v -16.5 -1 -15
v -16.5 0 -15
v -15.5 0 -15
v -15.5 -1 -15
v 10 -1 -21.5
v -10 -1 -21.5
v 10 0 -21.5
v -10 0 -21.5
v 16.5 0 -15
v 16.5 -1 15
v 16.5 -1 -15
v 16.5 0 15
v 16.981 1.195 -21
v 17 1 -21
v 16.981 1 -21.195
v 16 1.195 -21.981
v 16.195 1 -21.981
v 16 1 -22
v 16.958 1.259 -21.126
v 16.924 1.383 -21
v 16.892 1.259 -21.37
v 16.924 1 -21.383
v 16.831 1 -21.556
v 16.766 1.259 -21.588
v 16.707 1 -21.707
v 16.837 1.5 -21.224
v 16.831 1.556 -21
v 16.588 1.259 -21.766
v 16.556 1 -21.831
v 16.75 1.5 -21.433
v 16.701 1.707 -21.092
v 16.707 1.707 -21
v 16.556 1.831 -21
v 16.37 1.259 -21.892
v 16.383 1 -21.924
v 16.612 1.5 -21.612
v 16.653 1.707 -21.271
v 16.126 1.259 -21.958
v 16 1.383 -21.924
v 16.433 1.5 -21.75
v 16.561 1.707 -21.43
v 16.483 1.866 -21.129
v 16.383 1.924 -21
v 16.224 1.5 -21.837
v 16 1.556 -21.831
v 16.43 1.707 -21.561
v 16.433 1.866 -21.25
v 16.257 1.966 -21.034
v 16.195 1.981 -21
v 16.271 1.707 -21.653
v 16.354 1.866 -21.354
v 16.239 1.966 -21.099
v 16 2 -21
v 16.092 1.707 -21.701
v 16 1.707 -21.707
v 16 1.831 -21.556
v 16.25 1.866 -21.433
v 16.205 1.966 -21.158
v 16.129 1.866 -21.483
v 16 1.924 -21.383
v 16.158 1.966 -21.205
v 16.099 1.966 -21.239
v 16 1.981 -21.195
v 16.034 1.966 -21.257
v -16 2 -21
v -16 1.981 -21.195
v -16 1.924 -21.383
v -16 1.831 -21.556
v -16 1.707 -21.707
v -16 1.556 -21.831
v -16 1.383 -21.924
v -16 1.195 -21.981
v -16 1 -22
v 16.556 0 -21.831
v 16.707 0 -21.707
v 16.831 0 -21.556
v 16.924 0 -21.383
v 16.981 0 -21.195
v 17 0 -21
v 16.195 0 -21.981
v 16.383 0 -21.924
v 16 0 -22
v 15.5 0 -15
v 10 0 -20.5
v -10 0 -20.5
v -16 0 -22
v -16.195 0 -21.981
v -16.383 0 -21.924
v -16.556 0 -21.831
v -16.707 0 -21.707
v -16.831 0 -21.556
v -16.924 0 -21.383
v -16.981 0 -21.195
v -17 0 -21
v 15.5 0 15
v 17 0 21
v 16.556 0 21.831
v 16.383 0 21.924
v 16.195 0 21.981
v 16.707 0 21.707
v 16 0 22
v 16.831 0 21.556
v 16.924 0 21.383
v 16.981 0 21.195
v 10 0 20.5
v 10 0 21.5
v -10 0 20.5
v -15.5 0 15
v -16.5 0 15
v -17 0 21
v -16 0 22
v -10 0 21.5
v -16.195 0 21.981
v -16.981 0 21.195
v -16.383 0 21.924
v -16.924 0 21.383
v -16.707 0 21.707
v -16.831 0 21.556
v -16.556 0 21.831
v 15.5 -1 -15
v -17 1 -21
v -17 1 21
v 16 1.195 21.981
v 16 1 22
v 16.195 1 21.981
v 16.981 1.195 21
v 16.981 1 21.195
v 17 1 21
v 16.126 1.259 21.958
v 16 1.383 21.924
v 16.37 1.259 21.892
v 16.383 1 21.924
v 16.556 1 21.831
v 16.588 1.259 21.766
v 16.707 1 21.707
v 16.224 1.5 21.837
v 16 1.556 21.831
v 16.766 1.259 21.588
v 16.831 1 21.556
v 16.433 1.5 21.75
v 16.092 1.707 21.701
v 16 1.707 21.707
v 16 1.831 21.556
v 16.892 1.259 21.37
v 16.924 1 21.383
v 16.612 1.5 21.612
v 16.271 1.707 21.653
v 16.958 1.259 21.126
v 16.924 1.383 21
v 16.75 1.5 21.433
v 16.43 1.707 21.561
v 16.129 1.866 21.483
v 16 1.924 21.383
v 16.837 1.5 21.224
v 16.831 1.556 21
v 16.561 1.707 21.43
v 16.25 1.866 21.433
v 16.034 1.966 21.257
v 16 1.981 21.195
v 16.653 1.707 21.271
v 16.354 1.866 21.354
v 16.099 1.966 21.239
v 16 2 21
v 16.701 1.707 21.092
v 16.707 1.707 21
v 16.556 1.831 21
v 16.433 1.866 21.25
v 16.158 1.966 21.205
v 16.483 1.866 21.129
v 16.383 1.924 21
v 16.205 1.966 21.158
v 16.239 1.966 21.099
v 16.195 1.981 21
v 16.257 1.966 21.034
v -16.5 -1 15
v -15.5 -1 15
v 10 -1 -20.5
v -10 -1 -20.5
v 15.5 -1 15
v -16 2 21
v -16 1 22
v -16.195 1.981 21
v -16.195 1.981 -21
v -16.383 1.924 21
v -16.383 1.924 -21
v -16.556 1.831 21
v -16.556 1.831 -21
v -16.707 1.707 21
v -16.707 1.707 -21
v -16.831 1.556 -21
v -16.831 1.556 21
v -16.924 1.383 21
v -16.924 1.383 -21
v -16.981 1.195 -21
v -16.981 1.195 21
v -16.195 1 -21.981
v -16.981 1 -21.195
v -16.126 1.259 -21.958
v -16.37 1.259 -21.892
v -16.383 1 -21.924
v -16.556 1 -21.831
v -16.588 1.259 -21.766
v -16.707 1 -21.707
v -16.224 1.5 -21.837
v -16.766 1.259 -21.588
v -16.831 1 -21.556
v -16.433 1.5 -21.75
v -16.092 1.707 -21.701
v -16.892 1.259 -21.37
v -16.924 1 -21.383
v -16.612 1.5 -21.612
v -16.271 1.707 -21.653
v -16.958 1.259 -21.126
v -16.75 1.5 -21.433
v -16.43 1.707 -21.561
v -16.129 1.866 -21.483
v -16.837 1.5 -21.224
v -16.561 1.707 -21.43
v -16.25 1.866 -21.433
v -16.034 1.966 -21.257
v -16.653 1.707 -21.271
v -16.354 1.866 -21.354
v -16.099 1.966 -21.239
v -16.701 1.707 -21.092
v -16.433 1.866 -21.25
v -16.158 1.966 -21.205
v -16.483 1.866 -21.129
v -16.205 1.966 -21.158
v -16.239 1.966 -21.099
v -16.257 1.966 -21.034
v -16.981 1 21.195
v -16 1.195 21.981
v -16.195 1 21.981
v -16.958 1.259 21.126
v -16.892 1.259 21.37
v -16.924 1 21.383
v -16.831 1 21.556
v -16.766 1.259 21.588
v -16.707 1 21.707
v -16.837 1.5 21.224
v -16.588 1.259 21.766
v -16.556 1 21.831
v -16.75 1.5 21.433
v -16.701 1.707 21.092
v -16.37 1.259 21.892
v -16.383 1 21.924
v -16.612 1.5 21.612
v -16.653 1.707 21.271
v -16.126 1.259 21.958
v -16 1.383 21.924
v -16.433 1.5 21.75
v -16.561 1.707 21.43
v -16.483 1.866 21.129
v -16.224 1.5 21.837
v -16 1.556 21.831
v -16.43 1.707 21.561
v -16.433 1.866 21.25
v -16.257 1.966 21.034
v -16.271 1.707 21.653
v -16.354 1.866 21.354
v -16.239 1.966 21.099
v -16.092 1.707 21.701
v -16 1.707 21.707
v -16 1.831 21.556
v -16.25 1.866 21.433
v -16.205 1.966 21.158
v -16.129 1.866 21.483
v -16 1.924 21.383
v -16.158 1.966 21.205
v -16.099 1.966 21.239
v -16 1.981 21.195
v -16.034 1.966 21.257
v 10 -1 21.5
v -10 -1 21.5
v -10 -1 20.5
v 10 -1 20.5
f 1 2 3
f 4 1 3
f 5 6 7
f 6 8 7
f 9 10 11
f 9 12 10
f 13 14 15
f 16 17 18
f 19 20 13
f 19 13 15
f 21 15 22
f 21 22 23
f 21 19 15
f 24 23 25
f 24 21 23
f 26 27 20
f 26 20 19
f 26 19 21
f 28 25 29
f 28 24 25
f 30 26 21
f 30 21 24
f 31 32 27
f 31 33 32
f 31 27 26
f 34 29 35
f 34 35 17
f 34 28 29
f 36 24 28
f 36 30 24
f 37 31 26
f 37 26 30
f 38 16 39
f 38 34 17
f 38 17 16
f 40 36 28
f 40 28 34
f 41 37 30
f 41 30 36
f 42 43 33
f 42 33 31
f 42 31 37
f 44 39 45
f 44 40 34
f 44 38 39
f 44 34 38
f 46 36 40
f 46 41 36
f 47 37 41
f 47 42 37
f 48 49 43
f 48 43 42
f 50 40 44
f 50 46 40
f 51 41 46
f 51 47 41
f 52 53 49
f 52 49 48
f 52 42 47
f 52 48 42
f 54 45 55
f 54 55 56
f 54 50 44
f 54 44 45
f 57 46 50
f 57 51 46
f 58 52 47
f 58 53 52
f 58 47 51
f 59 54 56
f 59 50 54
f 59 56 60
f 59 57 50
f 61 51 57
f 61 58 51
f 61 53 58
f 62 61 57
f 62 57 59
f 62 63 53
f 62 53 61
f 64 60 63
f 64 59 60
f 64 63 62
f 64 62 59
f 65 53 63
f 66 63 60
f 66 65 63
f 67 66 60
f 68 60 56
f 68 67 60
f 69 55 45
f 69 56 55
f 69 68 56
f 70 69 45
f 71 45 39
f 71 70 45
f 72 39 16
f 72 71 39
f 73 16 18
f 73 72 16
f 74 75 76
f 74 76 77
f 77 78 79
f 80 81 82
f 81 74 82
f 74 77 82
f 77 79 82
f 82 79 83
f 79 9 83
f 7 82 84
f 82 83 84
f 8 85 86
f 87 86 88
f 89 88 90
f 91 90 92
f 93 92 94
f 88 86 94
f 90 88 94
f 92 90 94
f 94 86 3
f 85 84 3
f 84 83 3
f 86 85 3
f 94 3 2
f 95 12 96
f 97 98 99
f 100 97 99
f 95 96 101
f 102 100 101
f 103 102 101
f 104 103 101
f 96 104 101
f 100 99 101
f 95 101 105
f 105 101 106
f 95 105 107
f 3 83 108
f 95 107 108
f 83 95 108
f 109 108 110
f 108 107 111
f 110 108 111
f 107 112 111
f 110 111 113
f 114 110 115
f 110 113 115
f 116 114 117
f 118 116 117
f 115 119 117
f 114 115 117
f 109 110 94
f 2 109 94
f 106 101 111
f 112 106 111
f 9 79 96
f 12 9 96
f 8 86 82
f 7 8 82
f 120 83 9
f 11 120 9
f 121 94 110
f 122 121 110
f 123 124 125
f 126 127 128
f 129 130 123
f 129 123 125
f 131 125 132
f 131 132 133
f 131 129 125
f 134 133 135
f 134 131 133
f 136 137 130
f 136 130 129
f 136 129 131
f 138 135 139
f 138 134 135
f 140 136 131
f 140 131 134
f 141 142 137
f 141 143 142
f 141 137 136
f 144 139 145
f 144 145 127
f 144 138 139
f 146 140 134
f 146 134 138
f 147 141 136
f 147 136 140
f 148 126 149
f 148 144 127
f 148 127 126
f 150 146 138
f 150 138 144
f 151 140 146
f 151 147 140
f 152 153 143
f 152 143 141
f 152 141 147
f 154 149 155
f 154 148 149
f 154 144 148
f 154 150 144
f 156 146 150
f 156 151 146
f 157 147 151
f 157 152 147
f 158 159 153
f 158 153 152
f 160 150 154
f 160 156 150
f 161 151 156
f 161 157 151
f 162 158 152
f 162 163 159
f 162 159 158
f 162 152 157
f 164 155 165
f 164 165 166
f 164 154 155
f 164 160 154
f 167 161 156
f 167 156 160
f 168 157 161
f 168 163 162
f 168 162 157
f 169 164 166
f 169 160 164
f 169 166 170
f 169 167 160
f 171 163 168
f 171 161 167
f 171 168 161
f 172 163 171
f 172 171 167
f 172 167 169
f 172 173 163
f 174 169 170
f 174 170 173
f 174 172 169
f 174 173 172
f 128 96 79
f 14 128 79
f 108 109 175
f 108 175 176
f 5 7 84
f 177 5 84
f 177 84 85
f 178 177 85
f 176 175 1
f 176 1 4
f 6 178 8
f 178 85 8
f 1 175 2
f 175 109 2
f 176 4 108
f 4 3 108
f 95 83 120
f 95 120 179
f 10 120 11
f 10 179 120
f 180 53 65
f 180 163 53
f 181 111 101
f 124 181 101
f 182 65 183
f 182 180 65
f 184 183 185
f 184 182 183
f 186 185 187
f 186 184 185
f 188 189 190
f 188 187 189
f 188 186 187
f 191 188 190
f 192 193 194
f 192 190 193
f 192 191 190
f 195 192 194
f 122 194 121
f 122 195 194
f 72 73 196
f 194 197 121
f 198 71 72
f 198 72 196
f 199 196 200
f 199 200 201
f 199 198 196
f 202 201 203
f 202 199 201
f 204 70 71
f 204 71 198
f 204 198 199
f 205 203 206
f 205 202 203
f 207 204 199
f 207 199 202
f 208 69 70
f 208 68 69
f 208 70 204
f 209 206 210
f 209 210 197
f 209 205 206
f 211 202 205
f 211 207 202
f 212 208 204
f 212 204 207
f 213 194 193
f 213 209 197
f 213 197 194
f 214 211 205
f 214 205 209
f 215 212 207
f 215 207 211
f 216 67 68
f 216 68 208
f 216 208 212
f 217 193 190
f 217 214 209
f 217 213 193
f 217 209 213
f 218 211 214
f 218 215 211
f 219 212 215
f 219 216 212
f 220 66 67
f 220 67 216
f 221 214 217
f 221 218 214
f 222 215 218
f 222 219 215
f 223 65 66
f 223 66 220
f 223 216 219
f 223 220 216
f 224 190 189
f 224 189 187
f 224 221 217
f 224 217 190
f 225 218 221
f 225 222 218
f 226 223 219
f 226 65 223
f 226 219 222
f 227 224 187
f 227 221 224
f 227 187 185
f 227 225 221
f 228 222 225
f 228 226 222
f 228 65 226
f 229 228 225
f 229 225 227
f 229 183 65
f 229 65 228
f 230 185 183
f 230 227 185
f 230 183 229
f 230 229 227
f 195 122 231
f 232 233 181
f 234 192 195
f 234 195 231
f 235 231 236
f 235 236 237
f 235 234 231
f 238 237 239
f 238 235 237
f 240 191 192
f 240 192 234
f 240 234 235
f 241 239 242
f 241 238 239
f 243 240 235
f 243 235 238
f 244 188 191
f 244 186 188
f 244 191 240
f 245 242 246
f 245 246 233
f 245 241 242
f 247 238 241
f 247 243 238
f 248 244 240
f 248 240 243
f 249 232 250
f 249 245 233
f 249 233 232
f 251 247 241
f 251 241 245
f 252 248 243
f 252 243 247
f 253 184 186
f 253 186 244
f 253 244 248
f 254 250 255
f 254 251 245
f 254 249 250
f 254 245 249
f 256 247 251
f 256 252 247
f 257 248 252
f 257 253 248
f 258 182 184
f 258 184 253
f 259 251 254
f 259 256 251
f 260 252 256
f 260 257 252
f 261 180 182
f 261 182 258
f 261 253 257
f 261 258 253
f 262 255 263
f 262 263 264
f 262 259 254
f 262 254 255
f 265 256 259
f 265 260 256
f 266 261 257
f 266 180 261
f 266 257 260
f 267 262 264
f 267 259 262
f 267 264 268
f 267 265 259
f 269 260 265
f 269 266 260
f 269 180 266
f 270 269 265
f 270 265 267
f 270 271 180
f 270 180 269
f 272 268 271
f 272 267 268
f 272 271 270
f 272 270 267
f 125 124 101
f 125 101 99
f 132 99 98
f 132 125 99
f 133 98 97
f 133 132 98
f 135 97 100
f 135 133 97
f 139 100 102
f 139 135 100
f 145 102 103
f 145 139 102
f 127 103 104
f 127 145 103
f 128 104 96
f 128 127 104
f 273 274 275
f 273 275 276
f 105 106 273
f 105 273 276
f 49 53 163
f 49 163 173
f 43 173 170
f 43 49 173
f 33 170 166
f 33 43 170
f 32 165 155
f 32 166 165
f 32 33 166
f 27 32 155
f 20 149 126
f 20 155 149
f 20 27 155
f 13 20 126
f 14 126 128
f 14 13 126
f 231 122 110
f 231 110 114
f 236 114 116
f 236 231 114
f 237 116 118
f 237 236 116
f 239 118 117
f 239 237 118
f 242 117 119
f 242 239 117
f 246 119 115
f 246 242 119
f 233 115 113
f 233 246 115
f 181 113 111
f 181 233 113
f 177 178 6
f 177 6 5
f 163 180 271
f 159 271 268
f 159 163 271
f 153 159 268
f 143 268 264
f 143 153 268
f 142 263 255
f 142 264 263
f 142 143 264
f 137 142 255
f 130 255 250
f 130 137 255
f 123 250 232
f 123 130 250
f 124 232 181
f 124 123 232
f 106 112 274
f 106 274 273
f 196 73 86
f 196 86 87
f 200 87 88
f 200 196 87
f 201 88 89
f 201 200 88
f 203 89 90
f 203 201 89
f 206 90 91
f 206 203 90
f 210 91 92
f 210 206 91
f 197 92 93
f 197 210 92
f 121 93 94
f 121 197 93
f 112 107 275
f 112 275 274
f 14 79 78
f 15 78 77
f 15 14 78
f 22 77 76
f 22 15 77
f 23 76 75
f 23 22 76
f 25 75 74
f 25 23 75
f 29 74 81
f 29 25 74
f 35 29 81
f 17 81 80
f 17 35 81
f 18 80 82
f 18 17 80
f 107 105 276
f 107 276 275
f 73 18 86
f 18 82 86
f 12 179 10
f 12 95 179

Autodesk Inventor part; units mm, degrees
ref_plane "YZ Plane" through (0, 0, 0) normal (1, 0, 0) x (0, 1, 0)
ref_plane "XZ Plane" through (0, 0, 0) normal (0, 1, 0) x (-1, 0, 0)
ref_plane "XY Plane" through (0, 0, 0) normal (0, 0, 1) x (1, 0, 0)
sketch "Sketch4" plane through (0, 0, 0) normal (0, 1, 0) x (-1, 0, 0)
  line L0 (17, 22) -> (-17, 22)
  line L1 (-17, 22) -> (-17, -22)
  line L2 (-17, -22) -> (17, -22)
  line L3 (17, -22) -> (17, 22)
  line L4 (17, 22) -> (-17, -22) construction
  line L5 (-17, 22) -> (17, -22) construction
  point P0 (0, 0)
  dimension "d52" = 34
  dimension "d53" = 44
extrude "Extrusion5" add sketch "Sketch4" along normal blind 2
sketch "Sketch6" plane through (0, 0, 0) normal (0, -1, 0) x (1, 0, 0)
  line L0 (-16.5, -15) -> (-15.5, -15)
  line L1 (-15.5, -15) -> (-15.5, 5)
  line L2 (-15.5, 5) -> (-16.5, 5)
  line L3 (-16.5, 5) -> (-16.5, -15)
  line L4 (-15.5, -5) -> (-16.5, -5)
  line L5 (-16.5, -5) -> (-16.5, 15)
  line L6 (-16.5, 15) -> (-15.5, 15)
  line L7 (-15.5, 15) -> (-15.5, -5)
  line L8 (-10, 21.5) -> (10, 21.5)
  line L9 (10, 21.5) -> (10, 20.5)
  line L10 (10, 20.5) -> (-10, 20.5)
  line L11 (-10, 20.5) -> (-10, 21.5)
  line L12 (10, 21.5) -> (-10, 21.5)
  line L13 (-10, 21.5) -> (-10, 20.5)
  line L14 (-10, 20.5) -> (10, 20.5)
  line L15 (10, 20.5) -> (10, 21.5)
  line L16 (15.5, 15) -> (16.5, 15)
  line L17 (16.5, 15) -> (16.5, -5)
  line L18 (16.5, -5) -> (15.5, -5)
  line L19 (15.5, -5) -> (15.5, 15)
  line L20 (15.5, -15) -> (16.5, -15)
  line L21 (16.5, -15) -> (16.5, 5)
  line L22 (16.5, 5) -> (15.5, 5)
  line L23 (15.5, 5) -> (15.5, -15)
  line L24 (10, -20.5) -> (-10, -20.5)
  line L25 (-10, -20.5) -> (-10, -21.5)
  line L26 (-10, -21.5) -> (10, -21.5)
  line L27 (10, -21.5) -> (10, -20.5)
  line L28 (-10, -20.5) -> (10, -20.5)
  line L29 (10, -20.5) -> (10, -21.5)
  line L30 (10, -21.5) -> (-10, -21.5)
  line L31 (-10, -21.5) -> (-10, -20.5)
  line L32 (-17, 22) -> (-17, -22)
  line L33 (17, 22) -> (-17, 22)
  line L34 (17, -22) -> (17, 22)
  line L35 (-17, -22) -> (17, -22)
  line L36 (17, 22) -> (17, -22) projected
  line L37 (-17, -22) -> (-17, 22) projected
  line L38 (-17, 22) -> (17, 22) projected
  line L39 (17, -22) -> (-17, -22) projected
  point P0 (0, 0)
  point P1 (-16, 15)
  point P2 (-16, -5)
  point P3 (16, 15)
  point P4 (16, -15)
  point P5 (-10, -21)
  point P6 (-16, -15)
  dimension "d123" = 1
  dimension "d124" = 20
  dimension "d119" = 1
  dimension "d118" = 20
  dimension "d116" = 20
  dimension "d117" = 1
  dimension "d112" = 20
  dimension "d113" = 1
  dimension "d108" = 1
  dimension "d109" = 20
  dimension "d104" = 1
  dimension "d105" = 20
  dimension "d101" = 20
  dimension "d102" = 1
  dimension "d97" = 20
  dimension "d98" = 1
  dimension "d114" = 7
  dimension "d115" = 0.5
  dimension "d111" = 0.5
  dimension "d110" = 7
  dimension "d107" = 7
  dimension "d106" = 0.5
  dimension "d103" = 0.5
  dimension "d95" = 7
  dimension "d99" = 7
  dimension "d100" = 0.5
  dimension "d96" = 0.5
  dimension "d94" = 7
  dimension "d93" = 7
  dimension "d122" = 0.5
  dimension "d120" = 7
  dimension "d121" = 0.5
  dimension "d133" = 0
  dimension "d134" = 0
  dimension "d135" = 0
  dimension "d136" = 0
extrude "Extrusion7" add sketch "Sketch6" along normal blind 1 contours L3 L4 L1 L0 | L3 L2 L1 L4 | L5 L6 L7 L2 | L8 L9 L10 L11 | L16 L17 L22 L19 | L22 L17 L18 L19 | L18 L21 L20 L23 | L27 L26 L25 L24
fillet "Fillet9" radius 1 1 edges at (17, 1, -22)
fillet "Fillet10" radius 1 1 edges at (-17, 1, -22)
fillet "Fillet11" radius 1 1 edges at (-17, 1, 22)
fillet "Fillet12" radius 1 1 edges at (17, 1, 22)
fillet "Fillet13" radius 1 8 edges at (-16.7071, 2, -21.7071) (-17, 2, 0) (-16.7071, 2, 21.7071) (0, 2, 22) (16.7071, 2, 21.7071) (17, 2, 0) (16.7071, 2, -21.7071) (0, 2, -22)
properties part number "block_main" material "PC/ABS Plastic"
